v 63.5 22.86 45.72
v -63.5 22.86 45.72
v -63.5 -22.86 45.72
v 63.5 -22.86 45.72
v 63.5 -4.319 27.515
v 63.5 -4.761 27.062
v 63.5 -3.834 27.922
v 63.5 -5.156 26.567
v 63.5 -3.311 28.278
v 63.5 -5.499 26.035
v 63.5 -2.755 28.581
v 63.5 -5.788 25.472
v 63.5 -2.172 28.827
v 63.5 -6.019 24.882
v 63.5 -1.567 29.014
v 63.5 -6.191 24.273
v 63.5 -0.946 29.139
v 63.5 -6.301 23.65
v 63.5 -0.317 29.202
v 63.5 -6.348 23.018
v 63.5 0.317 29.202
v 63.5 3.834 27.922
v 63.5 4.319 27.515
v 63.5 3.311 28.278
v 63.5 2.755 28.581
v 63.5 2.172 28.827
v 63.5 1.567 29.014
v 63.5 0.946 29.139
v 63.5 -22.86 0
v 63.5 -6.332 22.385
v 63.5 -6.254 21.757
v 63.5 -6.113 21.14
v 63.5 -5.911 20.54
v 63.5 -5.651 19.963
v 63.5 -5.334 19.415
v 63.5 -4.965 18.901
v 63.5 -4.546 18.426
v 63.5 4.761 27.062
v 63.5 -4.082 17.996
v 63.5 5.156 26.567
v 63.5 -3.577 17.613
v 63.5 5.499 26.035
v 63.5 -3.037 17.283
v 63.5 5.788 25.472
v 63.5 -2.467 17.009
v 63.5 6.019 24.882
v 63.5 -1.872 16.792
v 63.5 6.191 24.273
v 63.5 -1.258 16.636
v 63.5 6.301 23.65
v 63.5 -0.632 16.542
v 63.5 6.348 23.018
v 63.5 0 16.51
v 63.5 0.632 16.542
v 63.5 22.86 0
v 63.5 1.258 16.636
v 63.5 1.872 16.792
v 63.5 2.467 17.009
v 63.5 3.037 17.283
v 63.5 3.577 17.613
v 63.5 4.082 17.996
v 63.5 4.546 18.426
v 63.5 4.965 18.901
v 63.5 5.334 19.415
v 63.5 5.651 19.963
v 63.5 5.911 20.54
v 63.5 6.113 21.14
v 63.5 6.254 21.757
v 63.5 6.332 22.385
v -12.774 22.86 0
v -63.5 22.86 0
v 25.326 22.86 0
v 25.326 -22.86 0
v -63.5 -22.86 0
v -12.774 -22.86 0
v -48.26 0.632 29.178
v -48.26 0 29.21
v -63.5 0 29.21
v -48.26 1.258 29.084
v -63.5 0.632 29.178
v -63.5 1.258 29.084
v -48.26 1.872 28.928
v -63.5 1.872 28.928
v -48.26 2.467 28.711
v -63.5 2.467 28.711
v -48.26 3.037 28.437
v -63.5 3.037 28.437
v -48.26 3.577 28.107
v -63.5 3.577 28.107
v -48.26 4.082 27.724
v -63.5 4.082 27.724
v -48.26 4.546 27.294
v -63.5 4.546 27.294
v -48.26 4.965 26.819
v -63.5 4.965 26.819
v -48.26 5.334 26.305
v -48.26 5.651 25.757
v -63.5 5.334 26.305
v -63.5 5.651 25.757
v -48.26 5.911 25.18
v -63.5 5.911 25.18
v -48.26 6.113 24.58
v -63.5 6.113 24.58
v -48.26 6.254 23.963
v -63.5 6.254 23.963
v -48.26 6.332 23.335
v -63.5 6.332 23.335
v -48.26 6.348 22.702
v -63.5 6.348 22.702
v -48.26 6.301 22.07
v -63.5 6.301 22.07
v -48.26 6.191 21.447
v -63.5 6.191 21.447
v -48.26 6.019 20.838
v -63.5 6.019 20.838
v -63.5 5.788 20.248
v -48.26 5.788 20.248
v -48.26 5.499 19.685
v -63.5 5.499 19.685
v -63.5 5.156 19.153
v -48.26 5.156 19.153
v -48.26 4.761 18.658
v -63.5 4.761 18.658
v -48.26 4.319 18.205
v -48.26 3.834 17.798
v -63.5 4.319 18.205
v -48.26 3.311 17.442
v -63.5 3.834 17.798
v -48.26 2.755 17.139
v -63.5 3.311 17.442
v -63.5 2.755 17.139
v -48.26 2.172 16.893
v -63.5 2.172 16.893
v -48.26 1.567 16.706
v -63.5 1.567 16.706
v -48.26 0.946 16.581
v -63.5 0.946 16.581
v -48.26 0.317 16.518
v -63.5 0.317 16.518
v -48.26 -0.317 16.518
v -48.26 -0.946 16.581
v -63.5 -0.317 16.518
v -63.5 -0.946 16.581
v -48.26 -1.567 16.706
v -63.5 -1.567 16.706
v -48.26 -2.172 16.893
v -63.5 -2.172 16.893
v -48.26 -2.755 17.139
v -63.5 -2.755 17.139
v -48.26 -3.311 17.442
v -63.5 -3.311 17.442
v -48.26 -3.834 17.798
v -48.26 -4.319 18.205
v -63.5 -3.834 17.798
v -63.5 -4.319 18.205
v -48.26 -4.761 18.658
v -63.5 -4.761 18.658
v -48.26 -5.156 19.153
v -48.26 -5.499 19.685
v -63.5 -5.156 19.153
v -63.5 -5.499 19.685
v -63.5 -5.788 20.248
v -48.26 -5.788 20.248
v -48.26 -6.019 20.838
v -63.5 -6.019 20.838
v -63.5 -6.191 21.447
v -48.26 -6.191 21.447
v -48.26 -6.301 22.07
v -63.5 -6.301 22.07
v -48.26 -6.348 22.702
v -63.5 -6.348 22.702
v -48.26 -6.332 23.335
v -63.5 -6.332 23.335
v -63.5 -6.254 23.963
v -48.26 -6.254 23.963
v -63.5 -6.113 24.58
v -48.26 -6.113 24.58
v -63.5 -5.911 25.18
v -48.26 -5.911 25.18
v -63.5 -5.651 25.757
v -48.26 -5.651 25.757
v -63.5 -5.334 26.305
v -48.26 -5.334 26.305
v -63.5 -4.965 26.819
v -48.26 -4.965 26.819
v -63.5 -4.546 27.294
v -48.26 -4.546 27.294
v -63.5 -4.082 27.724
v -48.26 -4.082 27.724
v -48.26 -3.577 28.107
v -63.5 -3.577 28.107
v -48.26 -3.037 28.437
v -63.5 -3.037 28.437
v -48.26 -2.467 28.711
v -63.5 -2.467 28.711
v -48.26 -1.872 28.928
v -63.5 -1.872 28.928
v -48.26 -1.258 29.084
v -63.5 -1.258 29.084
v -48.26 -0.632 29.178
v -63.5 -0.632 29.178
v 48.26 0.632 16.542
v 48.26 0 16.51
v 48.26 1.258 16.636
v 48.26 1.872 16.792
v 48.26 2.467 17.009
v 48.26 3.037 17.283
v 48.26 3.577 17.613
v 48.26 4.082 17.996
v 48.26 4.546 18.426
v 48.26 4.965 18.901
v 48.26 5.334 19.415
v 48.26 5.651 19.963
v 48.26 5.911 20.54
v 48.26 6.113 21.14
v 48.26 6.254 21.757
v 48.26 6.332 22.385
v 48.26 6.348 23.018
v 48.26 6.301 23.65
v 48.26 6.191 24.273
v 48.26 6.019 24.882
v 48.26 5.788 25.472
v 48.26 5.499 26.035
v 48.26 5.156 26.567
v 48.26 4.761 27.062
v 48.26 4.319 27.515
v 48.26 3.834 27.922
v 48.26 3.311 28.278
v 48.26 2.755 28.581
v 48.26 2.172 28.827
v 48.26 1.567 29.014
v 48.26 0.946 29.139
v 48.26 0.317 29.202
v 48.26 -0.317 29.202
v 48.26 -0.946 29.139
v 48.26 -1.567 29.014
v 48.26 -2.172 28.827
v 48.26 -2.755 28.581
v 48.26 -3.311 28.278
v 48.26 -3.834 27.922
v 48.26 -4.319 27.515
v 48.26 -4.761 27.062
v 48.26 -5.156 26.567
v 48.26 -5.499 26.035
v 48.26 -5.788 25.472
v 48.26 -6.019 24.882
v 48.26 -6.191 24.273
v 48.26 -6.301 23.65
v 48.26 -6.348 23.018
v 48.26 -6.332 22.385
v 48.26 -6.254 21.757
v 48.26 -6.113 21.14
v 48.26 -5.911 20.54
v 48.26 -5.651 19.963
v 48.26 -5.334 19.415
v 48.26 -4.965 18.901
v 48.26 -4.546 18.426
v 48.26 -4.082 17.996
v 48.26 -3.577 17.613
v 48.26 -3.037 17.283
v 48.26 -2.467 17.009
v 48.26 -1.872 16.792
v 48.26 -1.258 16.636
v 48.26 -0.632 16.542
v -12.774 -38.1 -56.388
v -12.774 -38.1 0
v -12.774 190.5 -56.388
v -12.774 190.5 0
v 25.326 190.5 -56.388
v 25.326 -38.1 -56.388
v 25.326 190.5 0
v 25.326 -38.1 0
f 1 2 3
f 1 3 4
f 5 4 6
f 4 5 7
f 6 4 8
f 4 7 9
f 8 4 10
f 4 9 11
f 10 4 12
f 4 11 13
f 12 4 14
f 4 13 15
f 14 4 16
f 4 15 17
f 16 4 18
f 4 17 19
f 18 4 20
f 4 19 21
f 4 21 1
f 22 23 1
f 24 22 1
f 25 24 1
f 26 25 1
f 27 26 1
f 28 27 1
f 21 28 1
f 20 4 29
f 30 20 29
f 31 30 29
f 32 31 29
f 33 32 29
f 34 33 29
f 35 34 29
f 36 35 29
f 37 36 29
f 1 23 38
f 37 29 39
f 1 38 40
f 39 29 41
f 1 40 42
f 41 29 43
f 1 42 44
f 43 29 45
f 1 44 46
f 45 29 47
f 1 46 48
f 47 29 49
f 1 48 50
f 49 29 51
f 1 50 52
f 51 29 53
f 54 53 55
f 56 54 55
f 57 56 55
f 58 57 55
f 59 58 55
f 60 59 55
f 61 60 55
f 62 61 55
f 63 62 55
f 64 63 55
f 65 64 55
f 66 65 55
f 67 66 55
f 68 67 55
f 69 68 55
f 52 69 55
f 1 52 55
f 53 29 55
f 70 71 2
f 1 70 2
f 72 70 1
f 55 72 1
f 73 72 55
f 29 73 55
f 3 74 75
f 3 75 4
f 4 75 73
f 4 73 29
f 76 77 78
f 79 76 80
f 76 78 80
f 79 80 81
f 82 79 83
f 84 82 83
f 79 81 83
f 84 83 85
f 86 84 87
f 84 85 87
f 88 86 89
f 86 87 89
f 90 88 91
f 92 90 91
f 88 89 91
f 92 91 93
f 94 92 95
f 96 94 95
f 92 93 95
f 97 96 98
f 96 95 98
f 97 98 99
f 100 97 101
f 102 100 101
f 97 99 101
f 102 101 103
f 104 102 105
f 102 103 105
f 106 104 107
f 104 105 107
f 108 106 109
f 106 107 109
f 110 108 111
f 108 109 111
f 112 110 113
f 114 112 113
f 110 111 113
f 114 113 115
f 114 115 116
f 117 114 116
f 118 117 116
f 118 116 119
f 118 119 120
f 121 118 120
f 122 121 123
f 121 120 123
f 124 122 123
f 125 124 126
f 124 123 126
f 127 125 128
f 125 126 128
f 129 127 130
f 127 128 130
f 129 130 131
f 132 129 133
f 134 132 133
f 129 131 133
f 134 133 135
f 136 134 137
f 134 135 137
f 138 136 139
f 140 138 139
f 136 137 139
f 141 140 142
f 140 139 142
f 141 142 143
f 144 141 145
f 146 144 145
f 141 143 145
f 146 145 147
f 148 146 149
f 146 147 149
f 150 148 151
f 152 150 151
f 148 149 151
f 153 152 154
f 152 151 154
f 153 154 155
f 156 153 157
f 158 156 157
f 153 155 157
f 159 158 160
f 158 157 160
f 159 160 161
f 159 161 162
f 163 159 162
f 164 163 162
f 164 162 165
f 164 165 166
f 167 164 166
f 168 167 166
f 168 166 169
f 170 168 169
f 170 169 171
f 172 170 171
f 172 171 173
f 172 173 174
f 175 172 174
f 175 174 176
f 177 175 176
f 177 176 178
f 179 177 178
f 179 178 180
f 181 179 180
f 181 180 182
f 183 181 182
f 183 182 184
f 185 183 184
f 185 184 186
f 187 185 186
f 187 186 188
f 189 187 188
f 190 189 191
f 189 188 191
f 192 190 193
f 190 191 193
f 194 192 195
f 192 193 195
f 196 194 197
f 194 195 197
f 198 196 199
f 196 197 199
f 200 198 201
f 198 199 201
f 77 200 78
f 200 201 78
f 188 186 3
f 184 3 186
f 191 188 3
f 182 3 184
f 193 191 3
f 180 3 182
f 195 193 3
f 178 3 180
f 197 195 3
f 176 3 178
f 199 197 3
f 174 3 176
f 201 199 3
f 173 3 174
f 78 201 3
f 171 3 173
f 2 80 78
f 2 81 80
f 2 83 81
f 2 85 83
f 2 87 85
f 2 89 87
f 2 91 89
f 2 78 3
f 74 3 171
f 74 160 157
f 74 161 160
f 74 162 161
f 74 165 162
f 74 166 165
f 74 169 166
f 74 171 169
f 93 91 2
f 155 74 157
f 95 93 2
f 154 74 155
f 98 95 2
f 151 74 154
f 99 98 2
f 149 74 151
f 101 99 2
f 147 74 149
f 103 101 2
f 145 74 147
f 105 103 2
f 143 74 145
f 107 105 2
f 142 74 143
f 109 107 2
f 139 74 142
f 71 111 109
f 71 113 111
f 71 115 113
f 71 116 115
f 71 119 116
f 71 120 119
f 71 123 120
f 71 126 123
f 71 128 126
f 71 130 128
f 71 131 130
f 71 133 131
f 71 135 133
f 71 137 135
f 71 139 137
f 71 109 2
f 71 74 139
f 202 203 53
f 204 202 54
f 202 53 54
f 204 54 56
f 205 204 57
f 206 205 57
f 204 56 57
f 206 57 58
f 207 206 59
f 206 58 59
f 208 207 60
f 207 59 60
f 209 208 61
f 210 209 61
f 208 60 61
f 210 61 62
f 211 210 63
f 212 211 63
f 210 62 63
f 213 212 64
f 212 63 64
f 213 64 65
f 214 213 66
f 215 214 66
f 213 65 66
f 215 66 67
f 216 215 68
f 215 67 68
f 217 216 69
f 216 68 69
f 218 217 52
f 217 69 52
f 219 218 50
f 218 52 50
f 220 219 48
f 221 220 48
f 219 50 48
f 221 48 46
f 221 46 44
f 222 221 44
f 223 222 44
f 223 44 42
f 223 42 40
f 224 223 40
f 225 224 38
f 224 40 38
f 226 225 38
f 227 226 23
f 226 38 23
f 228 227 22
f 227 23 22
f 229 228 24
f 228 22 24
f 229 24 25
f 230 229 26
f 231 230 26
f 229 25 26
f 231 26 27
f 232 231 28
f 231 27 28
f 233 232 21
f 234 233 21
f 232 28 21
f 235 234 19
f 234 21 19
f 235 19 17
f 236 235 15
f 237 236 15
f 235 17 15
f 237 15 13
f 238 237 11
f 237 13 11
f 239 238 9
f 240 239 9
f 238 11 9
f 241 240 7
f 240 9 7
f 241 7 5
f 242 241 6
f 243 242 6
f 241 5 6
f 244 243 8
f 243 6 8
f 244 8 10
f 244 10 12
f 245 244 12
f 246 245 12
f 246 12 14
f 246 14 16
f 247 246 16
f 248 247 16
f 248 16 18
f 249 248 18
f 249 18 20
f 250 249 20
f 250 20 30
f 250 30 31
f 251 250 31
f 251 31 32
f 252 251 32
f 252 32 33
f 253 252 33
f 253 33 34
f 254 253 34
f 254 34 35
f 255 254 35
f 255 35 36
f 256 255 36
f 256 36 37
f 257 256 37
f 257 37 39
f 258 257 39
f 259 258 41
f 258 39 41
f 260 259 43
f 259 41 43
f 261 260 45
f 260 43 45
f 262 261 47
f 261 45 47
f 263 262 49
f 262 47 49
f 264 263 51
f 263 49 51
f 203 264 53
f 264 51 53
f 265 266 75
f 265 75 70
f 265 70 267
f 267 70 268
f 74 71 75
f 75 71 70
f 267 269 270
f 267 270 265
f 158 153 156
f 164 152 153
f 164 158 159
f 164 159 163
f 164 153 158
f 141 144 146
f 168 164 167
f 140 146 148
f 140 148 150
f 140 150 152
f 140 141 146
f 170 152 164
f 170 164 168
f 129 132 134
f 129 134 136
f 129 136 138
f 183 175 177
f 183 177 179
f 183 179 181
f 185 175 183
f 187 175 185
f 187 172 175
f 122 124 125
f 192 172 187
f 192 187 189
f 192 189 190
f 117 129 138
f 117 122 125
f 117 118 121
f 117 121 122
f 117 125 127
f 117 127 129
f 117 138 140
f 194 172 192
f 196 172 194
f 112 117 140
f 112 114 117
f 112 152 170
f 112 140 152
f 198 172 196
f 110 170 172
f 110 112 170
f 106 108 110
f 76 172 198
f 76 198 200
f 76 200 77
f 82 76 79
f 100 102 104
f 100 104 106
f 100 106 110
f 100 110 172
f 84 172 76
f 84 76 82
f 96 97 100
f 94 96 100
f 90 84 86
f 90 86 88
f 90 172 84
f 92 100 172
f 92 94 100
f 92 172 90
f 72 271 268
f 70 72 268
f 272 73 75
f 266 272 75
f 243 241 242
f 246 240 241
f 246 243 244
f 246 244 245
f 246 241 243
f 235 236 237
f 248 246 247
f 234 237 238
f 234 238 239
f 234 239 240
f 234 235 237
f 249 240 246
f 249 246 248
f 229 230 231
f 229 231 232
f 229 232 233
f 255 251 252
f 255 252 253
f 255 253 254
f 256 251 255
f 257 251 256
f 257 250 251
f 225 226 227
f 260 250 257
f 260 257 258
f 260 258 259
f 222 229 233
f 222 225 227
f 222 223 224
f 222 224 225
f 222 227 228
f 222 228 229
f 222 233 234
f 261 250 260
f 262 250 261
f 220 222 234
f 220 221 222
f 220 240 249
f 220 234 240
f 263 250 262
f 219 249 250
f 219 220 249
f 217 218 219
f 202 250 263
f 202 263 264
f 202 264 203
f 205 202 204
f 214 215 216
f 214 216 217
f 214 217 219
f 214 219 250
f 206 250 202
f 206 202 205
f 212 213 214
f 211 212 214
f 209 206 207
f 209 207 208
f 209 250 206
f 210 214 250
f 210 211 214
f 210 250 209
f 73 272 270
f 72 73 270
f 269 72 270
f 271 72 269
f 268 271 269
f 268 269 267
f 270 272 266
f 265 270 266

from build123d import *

# Parameters (mm, degrees)
SKETCH1_W           = 127
SKETCH1_H           = 45.72
BOSS_EXTRUDE1_DEPTH = 45.72
SKETCH2_W           = 38.1
SKETCH2_H           = 228.6
BOSS_EXTRUDE2_DEPTH = 56.388
SKETCH3_R           = 6.35
CUT_EXTRUDE1_DEPTH  = 15.24
SKETCH4_R           = 6.35
CUT_EXTRUDE2_DEPTH  = 15.24


with BuildPart() as part:
    # Sketch1 → Boss-Extrude1 (new body)
    with BuildSketch(Plane.XY):
        Rectangle(SKETCH1_W, SKETCH1_H)
    extrude(amount=BOSS_EXTRUDE1_DEPTH)

    # Sketch2 → Boss-Extrude2 (add)
    with BuildSketch(Plane(origin=(0, 0, 0), x_dir=(-1, 0, 0), z_dir=(0, 0, -1))):
        with Locations((-6.276150489, 76.2)):
            Rectangle(SKETCH2_W, SKETCH2_H)
    extrude(amount=BOSS_EXTRUDE2_DEPTH)

    # Sketch3 → Cut-Extrude1 (cut)
    with BuildSketch(Plane(origin=(63.5, 0, 0), x_dir=(0, 0, -1), z_dir=(1, 0, 0))):
        with Locations((-22.86, 0)):
            Circle(SKETCH3_R)
    extrude(amount=-CUT_EXTRUDE1_DEPTH, mode=Mode.SUBTRACT)

    # Sketch4 → Cut-Extrude2 (cut)
    with BuildSketch(Plane.ZY.offset(63.5)):
        with Locations((22.86, 0)):
            Circle(SKETCH4_R)
    extrude(amount=-CUT_EXTRUDE2_DEPTH, mode=Mode.SUBTRACT)


solid = part.part
